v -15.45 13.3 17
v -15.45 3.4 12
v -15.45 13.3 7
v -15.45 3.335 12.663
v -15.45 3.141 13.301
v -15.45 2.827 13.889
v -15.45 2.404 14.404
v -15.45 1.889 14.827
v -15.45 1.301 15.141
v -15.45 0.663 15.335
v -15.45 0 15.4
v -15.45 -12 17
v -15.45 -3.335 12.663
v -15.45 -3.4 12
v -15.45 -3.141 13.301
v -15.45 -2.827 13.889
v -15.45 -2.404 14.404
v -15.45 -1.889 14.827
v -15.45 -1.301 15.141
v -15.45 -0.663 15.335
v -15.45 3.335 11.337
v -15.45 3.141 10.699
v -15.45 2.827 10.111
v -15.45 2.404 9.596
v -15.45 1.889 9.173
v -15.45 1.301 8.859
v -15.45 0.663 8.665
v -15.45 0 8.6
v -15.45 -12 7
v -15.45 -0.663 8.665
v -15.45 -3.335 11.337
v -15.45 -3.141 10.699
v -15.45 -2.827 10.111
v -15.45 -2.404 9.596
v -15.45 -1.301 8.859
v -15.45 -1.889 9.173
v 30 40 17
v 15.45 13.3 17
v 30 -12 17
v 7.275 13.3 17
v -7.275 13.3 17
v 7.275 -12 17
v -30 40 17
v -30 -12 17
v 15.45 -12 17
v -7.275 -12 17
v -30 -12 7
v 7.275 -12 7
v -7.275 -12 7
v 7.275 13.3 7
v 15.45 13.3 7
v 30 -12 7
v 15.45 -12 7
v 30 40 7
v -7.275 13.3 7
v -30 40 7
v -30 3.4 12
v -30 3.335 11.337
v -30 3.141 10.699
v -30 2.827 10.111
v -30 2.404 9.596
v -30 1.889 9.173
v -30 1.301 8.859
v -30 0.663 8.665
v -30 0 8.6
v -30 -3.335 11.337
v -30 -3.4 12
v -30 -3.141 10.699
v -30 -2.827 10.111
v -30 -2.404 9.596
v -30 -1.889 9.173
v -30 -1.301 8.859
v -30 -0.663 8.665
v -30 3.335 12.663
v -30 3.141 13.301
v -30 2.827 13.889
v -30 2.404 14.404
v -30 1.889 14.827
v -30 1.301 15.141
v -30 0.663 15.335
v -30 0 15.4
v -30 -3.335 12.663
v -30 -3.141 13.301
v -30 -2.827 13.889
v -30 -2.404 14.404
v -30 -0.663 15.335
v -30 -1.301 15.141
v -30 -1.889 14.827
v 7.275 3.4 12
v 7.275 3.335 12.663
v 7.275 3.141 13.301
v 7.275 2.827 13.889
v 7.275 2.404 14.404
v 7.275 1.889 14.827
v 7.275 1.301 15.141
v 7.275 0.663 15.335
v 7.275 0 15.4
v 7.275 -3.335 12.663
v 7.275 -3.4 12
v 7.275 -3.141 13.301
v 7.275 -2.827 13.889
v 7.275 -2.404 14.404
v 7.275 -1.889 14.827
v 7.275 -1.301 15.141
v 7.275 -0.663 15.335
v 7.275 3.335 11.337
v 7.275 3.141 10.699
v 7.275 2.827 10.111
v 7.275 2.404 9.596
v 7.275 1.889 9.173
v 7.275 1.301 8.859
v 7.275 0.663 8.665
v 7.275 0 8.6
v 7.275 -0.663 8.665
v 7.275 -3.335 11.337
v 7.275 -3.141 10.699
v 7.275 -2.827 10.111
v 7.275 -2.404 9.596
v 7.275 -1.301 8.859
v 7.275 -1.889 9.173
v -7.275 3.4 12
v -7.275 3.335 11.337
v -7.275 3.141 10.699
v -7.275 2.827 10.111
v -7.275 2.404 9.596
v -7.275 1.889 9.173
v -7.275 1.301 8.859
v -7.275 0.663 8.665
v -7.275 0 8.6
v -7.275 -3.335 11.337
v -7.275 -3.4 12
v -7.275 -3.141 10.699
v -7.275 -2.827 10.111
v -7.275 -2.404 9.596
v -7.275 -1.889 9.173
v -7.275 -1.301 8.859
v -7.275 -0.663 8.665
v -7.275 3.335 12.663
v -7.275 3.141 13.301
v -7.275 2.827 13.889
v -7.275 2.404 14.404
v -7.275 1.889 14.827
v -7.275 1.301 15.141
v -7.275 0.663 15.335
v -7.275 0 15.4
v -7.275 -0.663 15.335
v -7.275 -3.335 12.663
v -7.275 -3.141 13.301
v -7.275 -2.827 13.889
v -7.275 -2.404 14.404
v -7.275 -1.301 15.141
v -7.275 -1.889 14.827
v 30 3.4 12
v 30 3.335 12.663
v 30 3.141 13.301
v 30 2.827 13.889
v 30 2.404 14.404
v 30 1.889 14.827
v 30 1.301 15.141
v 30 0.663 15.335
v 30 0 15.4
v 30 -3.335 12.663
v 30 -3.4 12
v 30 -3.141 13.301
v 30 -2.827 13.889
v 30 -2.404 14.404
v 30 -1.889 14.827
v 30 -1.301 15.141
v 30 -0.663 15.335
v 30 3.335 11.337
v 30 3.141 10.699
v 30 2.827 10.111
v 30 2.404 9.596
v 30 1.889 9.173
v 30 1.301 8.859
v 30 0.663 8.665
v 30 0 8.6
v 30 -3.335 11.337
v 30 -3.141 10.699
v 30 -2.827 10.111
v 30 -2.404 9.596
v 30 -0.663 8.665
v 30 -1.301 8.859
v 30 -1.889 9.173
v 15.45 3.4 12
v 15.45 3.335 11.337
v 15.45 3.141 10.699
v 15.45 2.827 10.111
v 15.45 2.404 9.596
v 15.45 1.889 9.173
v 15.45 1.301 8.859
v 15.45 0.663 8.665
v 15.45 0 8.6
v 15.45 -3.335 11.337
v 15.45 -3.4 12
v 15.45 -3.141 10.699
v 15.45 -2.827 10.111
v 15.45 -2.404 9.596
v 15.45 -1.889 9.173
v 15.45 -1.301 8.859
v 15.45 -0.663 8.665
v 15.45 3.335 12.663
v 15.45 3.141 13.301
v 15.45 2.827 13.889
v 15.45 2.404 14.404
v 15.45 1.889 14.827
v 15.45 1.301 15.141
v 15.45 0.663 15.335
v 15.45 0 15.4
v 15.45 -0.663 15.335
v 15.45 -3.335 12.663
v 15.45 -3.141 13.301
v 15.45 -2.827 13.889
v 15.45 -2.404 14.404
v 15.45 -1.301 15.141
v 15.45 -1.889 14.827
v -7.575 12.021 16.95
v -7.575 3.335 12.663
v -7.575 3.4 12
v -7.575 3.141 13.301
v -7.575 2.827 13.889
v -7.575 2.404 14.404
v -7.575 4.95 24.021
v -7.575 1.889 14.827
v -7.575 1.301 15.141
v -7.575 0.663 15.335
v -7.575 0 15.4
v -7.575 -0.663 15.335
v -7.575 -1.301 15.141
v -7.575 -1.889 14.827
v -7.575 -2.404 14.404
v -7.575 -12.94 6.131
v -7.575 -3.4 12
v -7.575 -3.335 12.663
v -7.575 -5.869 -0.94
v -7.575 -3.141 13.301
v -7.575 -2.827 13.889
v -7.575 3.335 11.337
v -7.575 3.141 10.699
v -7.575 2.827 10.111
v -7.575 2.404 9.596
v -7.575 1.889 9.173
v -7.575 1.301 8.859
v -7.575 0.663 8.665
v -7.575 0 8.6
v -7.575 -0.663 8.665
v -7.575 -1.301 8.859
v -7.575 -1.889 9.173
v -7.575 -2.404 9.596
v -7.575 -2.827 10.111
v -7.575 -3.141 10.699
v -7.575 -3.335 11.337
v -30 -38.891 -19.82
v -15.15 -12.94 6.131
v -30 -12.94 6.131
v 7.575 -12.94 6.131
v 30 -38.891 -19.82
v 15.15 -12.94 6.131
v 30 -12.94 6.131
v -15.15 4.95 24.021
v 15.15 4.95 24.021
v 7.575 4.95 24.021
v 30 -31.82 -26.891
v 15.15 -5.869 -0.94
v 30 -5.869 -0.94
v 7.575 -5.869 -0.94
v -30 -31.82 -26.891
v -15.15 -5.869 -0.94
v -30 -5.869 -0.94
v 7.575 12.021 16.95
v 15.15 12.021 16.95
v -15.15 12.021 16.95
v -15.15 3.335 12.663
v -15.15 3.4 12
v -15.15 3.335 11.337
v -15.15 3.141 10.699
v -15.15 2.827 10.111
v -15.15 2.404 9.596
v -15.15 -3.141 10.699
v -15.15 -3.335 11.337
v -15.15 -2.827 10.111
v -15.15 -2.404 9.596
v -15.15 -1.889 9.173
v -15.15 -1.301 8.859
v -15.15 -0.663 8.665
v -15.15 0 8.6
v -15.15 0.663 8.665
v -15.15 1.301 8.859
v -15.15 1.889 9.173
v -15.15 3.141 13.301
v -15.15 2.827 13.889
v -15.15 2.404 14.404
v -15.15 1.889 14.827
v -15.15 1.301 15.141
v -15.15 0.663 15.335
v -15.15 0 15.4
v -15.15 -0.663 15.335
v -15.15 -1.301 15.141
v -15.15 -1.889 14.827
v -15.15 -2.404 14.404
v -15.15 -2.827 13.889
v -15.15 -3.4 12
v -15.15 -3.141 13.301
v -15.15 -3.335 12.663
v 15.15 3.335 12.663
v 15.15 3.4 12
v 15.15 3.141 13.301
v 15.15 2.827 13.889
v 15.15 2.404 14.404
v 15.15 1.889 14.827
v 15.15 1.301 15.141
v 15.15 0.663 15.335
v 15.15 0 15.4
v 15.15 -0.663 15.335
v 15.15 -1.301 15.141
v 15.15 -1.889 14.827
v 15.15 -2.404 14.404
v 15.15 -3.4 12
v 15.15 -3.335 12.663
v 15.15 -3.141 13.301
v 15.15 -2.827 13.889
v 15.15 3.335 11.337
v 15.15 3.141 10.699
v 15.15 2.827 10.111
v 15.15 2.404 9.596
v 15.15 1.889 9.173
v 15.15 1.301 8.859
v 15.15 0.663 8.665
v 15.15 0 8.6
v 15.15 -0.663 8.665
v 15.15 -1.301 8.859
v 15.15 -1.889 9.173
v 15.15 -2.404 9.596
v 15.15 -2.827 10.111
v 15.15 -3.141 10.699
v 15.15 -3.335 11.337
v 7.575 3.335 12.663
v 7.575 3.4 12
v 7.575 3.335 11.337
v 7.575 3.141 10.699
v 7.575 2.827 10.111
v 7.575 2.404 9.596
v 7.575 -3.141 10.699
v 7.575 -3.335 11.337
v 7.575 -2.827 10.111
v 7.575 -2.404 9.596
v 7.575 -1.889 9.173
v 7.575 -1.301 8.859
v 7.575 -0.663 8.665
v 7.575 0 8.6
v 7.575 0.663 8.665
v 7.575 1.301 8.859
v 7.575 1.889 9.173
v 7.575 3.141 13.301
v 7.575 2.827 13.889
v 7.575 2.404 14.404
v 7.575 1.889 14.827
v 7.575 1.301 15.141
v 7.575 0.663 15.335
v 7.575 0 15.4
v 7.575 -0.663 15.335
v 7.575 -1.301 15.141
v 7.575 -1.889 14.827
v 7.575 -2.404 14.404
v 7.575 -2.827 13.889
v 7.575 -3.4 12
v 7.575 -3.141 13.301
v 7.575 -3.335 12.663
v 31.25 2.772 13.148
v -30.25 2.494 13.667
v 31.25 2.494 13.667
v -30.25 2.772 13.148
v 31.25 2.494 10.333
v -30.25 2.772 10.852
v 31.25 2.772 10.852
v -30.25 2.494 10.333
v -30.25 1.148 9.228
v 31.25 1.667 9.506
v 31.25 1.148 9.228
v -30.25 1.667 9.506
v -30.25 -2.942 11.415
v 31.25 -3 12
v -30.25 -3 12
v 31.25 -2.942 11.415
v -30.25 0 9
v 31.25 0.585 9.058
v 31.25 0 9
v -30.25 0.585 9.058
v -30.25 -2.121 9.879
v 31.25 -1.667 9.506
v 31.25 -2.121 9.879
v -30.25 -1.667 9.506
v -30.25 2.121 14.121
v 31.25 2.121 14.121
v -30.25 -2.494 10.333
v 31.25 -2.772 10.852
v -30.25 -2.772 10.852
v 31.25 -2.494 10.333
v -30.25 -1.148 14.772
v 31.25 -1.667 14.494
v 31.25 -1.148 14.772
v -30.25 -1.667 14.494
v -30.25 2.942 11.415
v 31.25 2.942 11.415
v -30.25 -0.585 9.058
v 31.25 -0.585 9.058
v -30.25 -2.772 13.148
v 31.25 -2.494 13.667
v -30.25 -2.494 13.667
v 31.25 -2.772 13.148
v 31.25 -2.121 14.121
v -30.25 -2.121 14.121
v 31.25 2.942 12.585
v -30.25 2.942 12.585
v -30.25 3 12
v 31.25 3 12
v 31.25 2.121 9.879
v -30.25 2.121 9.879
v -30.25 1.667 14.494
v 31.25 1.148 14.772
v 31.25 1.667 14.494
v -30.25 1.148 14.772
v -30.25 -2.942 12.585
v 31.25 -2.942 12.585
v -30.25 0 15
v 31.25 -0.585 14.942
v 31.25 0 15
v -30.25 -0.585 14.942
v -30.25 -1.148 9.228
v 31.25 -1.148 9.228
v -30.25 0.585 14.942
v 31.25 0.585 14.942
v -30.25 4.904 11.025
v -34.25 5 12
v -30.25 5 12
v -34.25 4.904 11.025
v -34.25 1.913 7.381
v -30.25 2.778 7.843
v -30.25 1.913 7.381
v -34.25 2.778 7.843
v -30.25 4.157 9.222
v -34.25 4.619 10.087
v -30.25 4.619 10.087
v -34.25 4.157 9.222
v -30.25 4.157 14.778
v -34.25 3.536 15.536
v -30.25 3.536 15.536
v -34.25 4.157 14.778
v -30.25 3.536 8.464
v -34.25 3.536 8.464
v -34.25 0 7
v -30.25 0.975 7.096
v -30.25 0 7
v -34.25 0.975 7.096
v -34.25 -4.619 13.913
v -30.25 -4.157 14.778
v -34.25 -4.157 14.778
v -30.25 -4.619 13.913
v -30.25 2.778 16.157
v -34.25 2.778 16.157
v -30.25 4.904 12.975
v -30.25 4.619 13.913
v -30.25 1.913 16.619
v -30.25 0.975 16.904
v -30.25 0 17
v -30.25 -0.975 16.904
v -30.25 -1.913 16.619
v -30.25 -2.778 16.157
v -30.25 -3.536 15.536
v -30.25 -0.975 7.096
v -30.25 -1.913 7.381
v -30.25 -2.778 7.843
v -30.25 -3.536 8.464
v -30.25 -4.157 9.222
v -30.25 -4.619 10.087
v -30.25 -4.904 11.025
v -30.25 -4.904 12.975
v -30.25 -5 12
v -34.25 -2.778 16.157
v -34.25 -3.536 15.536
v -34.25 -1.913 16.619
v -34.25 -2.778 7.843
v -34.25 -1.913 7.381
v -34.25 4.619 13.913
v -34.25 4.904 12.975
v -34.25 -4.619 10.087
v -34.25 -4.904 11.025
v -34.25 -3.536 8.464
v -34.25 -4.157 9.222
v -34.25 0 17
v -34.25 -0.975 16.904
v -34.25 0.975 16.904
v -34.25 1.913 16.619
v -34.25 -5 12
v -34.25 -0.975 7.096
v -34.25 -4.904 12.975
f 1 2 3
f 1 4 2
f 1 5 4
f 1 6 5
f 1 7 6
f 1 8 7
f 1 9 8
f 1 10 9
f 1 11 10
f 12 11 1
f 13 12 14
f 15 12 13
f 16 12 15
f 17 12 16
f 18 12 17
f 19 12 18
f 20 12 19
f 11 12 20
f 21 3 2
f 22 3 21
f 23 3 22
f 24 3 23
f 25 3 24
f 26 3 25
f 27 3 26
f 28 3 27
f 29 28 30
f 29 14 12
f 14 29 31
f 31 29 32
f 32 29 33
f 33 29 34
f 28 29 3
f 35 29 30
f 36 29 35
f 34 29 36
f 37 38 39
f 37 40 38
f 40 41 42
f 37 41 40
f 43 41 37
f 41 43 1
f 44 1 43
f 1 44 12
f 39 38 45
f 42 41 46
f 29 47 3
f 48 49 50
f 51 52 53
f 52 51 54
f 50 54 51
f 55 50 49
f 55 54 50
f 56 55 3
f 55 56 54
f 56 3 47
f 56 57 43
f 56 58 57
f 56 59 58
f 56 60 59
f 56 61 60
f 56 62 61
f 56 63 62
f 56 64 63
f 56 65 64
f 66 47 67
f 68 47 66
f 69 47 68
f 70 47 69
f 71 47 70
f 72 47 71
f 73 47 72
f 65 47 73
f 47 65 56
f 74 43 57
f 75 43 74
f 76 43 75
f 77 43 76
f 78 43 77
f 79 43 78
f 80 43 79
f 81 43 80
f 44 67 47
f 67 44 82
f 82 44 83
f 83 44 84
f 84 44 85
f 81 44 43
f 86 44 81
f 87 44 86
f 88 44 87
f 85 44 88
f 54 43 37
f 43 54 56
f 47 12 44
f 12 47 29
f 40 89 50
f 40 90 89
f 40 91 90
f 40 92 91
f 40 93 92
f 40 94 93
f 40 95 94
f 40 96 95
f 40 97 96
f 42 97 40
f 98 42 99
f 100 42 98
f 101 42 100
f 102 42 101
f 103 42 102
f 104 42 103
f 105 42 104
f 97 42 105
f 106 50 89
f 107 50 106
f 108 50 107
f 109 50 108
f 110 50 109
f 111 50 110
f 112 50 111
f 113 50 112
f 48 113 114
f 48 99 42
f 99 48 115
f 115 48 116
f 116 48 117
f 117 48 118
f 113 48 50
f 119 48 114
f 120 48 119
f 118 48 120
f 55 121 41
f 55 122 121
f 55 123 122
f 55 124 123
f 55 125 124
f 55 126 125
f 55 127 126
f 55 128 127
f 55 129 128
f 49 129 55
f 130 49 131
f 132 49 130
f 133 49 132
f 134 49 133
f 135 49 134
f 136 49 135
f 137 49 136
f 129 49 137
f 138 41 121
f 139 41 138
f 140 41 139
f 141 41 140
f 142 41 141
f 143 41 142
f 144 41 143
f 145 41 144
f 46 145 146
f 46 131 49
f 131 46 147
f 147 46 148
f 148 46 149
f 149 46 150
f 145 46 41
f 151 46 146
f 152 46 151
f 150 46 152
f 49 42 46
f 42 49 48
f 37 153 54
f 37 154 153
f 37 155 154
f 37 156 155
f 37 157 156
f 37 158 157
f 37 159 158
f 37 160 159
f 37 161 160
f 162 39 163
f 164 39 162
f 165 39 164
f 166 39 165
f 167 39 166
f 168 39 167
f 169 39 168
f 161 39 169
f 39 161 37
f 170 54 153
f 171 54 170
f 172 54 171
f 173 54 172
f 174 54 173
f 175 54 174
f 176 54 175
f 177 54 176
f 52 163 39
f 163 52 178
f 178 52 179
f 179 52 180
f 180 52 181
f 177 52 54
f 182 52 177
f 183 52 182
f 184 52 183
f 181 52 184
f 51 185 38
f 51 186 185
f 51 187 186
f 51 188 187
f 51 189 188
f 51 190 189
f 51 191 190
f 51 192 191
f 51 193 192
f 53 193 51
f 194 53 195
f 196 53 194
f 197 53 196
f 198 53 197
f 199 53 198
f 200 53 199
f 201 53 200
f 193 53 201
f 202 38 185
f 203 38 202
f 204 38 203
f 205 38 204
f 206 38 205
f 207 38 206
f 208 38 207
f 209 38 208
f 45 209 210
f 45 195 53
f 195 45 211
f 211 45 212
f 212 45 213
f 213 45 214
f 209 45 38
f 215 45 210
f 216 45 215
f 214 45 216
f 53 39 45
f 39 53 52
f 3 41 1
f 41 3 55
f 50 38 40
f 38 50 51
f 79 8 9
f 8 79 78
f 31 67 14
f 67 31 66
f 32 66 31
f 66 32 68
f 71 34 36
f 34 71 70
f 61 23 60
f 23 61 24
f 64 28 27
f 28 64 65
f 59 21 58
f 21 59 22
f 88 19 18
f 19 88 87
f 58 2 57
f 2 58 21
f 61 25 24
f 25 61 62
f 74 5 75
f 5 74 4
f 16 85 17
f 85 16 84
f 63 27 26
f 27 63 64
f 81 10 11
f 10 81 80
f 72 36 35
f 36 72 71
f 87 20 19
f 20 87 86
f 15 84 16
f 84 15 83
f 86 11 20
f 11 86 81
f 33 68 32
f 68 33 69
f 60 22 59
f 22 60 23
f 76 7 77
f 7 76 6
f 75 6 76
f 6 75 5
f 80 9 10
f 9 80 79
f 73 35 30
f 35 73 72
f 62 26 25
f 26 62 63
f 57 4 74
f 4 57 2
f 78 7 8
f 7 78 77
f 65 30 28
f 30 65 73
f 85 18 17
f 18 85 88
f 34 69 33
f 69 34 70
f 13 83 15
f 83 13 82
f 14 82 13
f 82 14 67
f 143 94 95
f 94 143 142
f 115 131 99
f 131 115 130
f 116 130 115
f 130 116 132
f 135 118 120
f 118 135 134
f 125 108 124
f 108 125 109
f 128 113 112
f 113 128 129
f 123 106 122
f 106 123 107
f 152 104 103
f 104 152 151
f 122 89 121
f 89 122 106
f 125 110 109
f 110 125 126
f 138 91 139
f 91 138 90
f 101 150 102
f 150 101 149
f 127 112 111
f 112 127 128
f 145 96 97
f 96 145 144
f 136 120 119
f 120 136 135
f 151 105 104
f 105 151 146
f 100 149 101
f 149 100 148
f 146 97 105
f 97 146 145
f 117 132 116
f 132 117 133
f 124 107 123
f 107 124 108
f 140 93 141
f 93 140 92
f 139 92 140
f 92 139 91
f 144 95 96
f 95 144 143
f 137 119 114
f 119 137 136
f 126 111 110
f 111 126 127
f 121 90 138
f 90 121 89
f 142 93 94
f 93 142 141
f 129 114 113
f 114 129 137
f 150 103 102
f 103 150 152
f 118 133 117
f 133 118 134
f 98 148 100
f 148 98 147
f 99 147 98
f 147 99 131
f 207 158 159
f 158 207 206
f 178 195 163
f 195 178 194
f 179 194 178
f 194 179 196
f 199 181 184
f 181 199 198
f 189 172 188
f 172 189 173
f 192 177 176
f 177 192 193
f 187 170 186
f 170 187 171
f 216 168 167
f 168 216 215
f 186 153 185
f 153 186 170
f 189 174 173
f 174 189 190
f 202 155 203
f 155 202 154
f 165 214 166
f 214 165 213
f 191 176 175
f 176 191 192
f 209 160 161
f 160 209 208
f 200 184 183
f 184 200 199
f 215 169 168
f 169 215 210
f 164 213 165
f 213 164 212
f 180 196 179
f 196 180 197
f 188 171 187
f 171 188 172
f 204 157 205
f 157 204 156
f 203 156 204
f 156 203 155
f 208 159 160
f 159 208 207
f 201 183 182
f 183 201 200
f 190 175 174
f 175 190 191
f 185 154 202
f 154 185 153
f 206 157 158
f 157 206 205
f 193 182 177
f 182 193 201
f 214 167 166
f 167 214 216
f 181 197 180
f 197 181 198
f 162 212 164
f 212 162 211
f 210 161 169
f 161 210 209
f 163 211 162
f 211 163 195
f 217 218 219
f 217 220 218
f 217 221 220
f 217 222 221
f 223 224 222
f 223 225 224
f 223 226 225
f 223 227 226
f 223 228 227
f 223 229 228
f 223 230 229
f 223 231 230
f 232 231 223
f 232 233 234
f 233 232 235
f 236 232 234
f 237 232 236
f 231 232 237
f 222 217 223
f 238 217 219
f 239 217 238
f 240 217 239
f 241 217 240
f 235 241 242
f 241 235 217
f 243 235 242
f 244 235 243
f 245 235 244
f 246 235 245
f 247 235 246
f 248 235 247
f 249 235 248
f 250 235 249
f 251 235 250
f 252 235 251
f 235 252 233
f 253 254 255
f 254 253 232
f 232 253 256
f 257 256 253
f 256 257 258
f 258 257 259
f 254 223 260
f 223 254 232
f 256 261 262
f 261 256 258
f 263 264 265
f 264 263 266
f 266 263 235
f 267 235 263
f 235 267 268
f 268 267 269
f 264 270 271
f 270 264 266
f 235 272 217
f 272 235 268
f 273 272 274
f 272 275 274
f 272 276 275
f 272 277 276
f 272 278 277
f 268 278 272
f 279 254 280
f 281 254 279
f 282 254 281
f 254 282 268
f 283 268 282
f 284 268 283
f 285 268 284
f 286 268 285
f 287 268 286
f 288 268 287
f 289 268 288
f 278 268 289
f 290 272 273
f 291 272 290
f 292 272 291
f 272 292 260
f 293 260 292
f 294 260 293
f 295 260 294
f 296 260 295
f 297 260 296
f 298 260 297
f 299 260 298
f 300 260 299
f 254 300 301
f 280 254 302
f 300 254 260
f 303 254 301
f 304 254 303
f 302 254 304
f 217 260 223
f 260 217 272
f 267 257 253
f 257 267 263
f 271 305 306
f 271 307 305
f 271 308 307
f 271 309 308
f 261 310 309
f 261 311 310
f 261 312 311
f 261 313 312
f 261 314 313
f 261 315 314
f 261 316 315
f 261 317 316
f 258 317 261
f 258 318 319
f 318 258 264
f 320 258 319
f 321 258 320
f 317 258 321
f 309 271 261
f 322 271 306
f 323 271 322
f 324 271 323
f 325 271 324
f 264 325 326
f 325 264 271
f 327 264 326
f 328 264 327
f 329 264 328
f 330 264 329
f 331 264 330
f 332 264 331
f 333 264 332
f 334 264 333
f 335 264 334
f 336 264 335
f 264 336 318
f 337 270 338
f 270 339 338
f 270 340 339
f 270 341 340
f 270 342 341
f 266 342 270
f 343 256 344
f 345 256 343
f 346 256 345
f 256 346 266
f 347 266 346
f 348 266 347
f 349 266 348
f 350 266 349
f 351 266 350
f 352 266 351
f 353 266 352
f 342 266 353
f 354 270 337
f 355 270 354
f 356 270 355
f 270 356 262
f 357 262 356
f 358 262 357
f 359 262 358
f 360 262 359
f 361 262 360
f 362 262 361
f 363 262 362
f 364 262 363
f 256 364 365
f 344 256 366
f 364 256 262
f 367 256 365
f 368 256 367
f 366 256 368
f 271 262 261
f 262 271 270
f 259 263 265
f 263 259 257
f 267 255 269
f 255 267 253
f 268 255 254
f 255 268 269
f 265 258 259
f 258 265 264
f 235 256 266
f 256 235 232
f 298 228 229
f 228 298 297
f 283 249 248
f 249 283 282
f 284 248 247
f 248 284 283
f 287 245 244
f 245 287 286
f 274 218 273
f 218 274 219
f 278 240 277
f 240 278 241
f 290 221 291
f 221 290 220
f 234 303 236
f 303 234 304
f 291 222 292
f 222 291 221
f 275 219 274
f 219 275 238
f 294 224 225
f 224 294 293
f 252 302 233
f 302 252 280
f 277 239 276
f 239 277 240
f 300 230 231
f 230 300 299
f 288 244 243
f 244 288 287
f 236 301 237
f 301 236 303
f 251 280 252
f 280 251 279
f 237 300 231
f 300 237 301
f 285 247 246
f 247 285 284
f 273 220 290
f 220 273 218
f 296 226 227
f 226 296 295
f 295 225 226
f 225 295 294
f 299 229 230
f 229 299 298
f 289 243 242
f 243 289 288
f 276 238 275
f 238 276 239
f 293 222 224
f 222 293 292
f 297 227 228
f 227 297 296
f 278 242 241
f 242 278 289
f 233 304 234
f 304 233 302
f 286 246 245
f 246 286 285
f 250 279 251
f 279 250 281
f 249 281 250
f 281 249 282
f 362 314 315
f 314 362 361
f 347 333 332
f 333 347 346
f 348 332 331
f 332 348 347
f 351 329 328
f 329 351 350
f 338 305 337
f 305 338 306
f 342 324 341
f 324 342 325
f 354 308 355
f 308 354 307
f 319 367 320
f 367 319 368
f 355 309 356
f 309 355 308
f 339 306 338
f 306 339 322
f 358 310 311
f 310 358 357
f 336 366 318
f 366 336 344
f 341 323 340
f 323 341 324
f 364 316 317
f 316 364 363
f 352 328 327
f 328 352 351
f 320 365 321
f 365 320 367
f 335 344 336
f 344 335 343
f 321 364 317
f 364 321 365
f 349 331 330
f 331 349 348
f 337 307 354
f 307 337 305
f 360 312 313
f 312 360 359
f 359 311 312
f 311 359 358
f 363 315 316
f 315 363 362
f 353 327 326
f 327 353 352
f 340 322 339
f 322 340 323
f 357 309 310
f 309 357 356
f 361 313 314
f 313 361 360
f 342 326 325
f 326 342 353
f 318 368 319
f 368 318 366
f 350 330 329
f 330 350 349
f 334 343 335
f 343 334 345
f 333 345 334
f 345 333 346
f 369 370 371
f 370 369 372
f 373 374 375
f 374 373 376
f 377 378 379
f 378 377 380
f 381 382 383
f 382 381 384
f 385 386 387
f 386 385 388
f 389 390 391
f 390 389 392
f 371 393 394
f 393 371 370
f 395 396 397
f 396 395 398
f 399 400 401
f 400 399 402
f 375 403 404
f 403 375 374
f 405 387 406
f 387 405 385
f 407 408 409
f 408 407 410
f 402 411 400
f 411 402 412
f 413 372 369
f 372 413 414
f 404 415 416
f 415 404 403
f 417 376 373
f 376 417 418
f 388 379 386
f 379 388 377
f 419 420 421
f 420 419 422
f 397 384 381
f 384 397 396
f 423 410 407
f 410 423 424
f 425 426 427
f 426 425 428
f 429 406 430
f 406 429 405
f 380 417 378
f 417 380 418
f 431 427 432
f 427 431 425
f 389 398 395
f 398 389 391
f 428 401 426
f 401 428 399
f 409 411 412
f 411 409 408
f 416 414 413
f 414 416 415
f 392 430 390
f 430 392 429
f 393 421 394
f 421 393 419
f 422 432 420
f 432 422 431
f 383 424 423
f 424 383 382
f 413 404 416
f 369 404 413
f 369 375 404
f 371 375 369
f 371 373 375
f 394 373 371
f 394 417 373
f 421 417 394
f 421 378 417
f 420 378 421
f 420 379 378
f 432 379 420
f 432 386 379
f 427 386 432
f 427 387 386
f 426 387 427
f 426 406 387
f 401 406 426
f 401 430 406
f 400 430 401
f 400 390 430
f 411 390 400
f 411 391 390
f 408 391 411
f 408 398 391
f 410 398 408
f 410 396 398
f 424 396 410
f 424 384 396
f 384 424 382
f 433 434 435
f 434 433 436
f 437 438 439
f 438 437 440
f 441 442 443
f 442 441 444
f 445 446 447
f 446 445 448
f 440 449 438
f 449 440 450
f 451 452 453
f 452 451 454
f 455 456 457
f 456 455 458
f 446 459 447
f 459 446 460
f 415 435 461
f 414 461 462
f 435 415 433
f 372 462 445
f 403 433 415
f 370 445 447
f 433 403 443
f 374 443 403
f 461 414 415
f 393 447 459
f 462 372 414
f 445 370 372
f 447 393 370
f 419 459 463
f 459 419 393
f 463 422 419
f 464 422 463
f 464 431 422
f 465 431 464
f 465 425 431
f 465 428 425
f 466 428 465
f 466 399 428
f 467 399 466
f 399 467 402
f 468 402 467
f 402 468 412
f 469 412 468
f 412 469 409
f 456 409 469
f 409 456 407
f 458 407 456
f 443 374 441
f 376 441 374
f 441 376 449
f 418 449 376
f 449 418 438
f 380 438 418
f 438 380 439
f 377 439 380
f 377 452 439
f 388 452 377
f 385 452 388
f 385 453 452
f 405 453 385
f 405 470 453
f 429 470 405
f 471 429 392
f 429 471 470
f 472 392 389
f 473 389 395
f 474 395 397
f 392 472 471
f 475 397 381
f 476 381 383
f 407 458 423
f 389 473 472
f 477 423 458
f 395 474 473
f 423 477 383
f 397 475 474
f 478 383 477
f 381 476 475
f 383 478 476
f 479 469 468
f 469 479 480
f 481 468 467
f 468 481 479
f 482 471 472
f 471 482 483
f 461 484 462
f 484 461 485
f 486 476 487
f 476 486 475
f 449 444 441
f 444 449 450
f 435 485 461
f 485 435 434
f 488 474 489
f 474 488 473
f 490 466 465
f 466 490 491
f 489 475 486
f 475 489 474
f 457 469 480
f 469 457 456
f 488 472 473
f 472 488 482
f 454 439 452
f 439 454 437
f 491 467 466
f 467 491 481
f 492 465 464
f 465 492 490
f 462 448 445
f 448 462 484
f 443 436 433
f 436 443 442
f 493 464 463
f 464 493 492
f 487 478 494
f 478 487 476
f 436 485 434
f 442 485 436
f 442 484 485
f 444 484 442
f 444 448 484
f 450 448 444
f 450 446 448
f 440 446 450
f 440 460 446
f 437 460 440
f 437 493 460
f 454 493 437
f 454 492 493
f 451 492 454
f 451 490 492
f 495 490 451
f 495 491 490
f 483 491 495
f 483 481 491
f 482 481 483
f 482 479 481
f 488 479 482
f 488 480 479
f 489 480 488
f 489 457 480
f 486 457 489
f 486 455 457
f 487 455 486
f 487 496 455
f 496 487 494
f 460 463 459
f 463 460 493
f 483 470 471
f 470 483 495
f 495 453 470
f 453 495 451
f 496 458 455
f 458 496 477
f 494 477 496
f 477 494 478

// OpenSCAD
$fn = 32;

// ------------------------------------------------------------------------
// Butt hinge: hinge 60 mm, leaf swung 45 deg
// Every part is its own module, assembly() places every instance.
// ------------------------------------------------------------------------

// --- part 1 ---
module hinge_base() {
  difference() {
    union() {
      translate([-30, -12, -5]) cube([14.55, 52, 10]);
      translate([-7.275, -12, -5]) cube([14.55, 52, 10]);
      translate([15.45, -12, -5]) cube([14.55, 52, 10]);
      translate([-30, 13.3, -5]) cube([60, 26.7, 10]);
    }
    translate([-22.725, 0, 0]) rotate([0, 90, 0]) cylinder(h = 16.55, d = 6.8, center = true);
    translate([0, 0, 0]) rotate([0, 90, 0]) cylinder(h = 16.55, d = 6.8, center = true);
    translate([22.725, 0, 0]) rotate([0, 90, 0]) cylinder(h = 16.55, d = 6.8, center = true);
  }
}

// --- part 2 ---
module hinge_mover() {
  difference() {
    union() {
      translate([-15.15, -50, -5]) cube([7.575, 62, 10]);
      translate([7.575, -50, -5]) cube([7.575, 62, 10]);
      translate([-30, -50, -5]) cube([60, 36.7, 10]);
    }
    translate([-11.362, 0, 0]) rotate([0, 90, 0]) cylinder(h = 9.575, d = 6.8, center = true);
    translate([11.362, 0, 0]) rotate([0, 90, 0]) cylinder(h = 9.575, d = 6.8, center = true);
  }
}

// --- part 3 ---
module hinge_pin() {
  rotate([0, 90, 0]) cylinder(h = 62.5, d = 6, center = true);
  translate([-34.25, 0, 0]) rotate([0, 90, 0]) cylinder(h = 4, d = 10);
}

// --- assembly ---
module assembly() {
  color([0.80, 0.24, 0.20]) translate([0, 0, 12]) rotate([0, 0, 0]) hinge_base();
  color([0.20, 0.45, 0.75]) translate([0, 0, 12]) rotate([45, 0, 0]) hinge_mover();
  color([0.25, 0.62, 0.32]) translate([0, 0, 12]) rotate([0, 0, 0]) hinge_pin();
}

assembly();
